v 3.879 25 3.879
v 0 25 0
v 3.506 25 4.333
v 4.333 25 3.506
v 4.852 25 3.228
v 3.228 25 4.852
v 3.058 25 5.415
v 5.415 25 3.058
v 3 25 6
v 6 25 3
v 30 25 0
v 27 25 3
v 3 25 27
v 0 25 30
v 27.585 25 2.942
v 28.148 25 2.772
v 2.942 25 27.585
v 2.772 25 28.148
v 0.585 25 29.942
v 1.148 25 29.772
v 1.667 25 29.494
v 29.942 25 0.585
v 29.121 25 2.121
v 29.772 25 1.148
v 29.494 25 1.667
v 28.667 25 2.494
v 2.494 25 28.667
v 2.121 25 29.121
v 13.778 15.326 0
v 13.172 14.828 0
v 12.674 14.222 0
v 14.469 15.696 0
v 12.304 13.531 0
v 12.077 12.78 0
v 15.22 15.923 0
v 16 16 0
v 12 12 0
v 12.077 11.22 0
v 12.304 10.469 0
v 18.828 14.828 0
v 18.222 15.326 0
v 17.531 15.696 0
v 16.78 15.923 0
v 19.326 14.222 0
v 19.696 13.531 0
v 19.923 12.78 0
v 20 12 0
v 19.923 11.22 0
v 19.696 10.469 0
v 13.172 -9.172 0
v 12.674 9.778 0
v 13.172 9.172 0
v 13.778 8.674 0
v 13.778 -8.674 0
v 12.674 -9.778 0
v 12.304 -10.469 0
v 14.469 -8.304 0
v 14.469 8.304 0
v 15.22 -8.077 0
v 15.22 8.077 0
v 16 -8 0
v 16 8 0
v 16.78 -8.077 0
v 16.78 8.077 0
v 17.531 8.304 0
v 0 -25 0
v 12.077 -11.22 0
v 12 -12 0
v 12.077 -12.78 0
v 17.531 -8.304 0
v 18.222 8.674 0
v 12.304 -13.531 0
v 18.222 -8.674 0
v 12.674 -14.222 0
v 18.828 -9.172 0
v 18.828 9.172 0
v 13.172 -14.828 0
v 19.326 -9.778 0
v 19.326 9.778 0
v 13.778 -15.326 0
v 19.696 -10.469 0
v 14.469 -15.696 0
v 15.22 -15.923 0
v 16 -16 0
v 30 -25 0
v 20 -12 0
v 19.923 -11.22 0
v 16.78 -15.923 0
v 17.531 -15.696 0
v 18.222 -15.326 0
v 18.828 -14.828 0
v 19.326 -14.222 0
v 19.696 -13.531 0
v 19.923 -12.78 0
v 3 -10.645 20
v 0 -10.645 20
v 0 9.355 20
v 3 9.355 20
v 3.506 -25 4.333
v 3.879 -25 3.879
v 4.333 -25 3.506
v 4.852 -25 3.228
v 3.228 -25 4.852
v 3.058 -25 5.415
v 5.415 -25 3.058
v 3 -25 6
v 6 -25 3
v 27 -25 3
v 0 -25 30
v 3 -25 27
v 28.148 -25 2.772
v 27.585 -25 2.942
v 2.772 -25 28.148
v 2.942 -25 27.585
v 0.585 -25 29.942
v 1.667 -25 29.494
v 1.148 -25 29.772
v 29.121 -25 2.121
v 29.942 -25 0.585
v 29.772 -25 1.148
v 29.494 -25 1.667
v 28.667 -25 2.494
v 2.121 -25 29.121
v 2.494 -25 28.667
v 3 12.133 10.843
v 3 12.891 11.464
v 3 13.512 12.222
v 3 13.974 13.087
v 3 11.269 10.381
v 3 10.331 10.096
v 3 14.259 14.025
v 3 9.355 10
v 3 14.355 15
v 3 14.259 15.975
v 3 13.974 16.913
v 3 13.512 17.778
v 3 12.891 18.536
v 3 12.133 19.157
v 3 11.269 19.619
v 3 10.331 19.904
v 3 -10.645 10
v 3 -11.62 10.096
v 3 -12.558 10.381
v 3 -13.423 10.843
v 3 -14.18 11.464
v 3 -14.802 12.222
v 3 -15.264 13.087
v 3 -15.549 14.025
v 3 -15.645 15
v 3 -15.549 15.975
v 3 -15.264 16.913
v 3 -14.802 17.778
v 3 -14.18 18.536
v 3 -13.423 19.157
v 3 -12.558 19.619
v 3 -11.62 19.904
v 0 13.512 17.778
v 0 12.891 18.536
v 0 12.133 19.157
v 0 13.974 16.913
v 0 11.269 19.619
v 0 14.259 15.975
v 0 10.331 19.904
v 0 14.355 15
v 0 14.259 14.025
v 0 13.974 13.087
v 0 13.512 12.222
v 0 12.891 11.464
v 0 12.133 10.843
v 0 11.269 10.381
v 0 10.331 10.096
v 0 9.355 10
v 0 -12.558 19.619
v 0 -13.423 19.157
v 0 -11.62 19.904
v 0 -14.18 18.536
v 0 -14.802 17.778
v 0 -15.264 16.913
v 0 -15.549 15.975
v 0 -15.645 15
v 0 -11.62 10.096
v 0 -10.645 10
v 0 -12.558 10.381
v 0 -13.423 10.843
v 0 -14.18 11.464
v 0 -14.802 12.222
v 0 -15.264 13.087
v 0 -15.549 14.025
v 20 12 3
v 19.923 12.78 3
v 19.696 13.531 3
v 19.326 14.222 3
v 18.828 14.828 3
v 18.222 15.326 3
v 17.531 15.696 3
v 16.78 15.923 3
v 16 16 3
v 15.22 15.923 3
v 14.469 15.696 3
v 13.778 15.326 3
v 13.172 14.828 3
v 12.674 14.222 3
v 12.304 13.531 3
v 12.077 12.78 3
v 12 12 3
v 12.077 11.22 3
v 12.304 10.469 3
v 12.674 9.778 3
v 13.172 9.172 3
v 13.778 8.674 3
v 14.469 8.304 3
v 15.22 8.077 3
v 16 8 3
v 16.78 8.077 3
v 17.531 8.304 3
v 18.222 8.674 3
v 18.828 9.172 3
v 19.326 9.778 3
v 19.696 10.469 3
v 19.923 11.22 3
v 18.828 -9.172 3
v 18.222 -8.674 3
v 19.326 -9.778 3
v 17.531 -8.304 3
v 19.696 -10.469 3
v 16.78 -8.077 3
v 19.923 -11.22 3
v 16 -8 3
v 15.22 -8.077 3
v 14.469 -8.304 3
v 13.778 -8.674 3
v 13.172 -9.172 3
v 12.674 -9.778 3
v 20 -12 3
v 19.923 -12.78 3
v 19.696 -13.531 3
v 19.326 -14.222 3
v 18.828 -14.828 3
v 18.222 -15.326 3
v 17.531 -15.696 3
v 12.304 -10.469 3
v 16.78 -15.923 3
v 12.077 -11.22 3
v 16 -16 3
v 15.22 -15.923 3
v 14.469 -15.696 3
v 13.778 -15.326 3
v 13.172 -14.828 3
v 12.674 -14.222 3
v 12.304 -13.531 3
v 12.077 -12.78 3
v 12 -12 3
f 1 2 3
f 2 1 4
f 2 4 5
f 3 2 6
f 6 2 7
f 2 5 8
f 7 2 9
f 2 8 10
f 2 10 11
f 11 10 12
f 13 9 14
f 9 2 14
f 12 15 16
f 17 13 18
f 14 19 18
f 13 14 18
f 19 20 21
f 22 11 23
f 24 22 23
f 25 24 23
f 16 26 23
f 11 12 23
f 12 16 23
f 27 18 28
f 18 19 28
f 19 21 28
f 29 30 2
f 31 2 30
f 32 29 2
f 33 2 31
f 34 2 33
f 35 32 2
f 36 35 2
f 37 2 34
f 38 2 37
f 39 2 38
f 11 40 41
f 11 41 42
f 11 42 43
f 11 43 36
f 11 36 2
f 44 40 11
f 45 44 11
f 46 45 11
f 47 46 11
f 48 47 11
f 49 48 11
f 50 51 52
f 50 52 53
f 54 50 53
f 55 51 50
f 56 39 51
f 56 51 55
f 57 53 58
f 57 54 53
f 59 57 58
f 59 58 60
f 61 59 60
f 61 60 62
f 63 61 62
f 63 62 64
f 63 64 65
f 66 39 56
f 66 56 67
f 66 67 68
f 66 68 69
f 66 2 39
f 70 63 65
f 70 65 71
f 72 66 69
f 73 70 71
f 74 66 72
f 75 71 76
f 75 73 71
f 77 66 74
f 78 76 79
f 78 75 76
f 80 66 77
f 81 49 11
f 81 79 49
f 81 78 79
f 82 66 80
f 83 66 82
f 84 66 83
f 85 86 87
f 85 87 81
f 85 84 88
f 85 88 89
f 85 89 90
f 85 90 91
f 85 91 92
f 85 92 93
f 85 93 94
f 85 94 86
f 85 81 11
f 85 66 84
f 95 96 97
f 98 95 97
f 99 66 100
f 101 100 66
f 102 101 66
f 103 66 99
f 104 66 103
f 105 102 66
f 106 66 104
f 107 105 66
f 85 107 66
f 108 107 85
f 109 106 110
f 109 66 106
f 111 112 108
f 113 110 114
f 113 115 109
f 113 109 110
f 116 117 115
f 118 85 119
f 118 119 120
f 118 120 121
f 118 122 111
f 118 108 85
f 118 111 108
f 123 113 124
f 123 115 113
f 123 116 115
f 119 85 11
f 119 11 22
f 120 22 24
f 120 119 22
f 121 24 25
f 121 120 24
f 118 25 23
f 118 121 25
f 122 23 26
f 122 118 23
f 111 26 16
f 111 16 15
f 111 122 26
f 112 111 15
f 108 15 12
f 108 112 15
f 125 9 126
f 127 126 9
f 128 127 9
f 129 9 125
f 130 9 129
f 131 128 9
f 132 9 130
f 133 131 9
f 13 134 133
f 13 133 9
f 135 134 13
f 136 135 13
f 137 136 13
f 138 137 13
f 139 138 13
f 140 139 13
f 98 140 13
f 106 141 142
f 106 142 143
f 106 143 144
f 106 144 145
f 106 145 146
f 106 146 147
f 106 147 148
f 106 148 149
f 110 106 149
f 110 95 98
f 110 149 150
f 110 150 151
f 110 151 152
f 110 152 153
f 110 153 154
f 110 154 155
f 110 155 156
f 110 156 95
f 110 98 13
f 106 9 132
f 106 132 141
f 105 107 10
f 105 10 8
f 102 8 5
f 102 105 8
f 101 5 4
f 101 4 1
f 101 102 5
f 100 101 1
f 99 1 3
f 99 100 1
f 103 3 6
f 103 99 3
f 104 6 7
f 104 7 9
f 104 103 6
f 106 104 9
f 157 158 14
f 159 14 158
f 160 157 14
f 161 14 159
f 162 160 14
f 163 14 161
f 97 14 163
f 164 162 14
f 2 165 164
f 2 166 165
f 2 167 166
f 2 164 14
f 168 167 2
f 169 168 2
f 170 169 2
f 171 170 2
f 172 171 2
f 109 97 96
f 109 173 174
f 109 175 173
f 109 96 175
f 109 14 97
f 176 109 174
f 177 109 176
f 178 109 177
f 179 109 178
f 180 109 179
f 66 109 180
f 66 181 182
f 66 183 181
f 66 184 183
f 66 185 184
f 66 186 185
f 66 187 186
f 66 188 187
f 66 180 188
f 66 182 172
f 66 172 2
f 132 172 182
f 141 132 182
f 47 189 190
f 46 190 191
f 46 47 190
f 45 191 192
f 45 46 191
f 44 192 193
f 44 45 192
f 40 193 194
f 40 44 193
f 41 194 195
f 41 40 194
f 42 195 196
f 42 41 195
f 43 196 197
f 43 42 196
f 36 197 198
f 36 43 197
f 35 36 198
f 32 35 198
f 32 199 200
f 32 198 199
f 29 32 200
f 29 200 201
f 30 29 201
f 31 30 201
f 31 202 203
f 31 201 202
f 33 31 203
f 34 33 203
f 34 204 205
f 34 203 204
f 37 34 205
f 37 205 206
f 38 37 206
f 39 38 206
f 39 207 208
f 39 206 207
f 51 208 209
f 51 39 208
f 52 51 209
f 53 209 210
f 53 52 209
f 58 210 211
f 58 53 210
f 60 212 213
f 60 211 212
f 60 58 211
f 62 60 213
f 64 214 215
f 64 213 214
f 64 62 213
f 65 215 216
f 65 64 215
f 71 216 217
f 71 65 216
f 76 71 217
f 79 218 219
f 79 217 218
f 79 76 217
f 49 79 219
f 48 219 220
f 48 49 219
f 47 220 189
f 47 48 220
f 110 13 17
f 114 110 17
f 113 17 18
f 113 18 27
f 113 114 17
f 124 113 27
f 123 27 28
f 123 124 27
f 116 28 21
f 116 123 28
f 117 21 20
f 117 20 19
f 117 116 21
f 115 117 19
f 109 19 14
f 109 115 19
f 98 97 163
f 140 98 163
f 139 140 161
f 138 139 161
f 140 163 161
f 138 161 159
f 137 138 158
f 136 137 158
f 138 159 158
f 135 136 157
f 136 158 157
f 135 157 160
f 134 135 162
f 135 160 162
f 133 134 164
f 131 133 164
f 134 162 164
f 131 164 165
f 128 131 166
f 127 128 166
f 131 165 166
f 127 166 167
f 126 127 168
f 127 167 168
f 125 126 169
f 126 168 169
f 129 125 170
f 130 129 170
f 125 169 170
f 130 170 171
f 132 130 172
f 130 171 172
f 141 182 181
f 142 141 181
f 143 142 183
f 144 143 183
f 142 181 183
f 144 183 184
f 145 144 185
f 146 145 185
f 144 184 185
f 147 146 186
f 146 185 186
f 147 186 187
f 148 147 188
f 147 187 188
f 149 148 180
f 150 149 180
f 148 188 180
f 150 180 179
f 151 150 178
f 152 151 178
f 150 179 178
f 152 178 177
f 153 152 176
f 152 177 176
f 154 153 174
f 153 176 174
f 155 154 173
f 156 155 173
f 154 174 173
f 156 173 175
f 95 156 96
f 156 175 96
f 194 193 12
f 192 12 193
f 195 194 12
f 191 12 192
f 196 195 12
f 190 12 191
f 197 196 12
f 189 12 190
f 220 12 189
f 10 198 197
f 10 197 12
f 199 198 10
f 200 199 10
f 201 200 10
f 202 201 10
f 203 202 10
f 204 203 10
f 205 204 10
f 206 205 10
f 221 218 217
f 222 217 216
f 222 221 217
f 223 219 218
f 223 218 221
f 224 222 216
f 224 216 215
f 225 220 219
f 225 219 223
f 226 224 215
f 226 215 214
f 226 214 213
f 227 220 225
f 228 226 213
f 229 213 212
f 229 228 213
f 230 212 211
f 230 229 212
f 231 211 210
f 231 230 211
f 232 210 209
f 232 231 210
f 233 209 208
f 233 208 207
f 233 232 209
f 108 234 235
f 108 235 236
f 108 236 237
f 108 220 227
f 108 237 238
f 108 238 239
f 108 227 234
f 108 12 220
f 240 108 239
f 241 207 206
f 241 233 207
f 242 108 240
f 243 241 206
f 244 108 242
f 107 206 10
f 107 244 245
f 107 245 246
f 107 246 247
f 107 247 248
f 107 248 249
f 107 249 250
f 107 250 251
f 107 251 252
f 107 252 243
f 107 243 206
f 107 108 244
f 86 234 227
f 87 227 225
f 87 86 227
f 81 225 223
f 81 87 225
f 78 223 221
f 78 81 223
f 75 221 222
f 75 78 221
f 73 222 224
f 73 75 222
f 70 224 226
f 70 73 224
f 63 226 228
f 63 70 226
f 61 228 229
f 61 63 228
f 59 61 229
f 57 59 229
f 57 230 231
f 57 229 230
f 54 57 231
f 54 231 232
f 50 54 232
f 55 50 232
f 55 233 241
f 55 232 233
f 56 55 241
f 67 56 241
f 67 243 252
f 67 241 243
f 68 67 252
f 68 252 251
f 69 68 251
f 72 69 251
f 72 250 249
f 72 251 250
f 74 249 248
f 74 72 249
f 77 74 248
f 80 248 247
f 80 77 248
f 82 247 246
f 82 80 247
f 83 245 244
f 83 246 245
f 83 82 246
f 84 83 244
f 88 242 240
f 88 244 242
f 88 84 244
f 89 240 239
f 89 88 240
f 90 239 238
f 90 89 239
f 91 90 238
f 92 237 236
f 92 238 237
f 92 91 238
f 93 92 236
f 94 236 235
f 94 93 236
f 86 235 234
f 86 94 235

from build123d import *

# Parameters (mm, degrees)
F1_DEPTH      = 25
F1_DEPTH_BACK = 25
F2_R          = 4
F3_DEPTH      = 25
F6_DEPTH      = 25


with BuildPart() as f1:
    # F0 (on Front) → F1 (new body, two sides)
    with BuildSketch(Plane.XZ) as f1_sk:
        with BuildLine():
            Line((0, 30), (0, 0))
            Line((0, 0), (30, 0))
            ThreePointArc((30, 0), (29.12132, 2.12132), (27, 3))
            Line((27, 3), (6, 3))
            ThreePointArc((6, 3), (3.87868, 3.87868), (3, 6))
            Line((3, 6), (3, 27))
            ThreePointArc((3, 27), (2.12132, 29.12132), (0, 30))
        make_face()
    extrude(amount=F1_DEPTH)
    extrude(f1_sk.sketch, amount=-F1_DEPTH_BACK)

    # F2 (on Top) → F3 (cut)
    with BuildSketch(Plane.XY):
        with Locations((16, -12)):
            Circle(F2_R)
        with Locations((16, 12)):
            Circle(F2_R)
    extrude(amount=F3_DEPTH, mode=Mode.SUBTRACT)

    # F5 (on face) → F6 (cut)
    with BuildSketch(Plane(origin=(0, 0, 0), x_dir=(0, -1, 0), z_dir=(-1, 0, 0))):
        with BuildLine():
            ThreePointArc((-9.355084, 20), (-14.355084, 15), (-9.355084, 10))
            Line((-9.355084, 10), (10.644916, 10))
            ThreePointArc((10.644916, 10), (15.644916, 15), (10.644916, 20))
            Line((10.644916, 20), (-9.355084, 20))
        make_face()
    extrude(amount=-F6_DEPTH, mode=Mode.SUBTRACT)


solid = f1.part
